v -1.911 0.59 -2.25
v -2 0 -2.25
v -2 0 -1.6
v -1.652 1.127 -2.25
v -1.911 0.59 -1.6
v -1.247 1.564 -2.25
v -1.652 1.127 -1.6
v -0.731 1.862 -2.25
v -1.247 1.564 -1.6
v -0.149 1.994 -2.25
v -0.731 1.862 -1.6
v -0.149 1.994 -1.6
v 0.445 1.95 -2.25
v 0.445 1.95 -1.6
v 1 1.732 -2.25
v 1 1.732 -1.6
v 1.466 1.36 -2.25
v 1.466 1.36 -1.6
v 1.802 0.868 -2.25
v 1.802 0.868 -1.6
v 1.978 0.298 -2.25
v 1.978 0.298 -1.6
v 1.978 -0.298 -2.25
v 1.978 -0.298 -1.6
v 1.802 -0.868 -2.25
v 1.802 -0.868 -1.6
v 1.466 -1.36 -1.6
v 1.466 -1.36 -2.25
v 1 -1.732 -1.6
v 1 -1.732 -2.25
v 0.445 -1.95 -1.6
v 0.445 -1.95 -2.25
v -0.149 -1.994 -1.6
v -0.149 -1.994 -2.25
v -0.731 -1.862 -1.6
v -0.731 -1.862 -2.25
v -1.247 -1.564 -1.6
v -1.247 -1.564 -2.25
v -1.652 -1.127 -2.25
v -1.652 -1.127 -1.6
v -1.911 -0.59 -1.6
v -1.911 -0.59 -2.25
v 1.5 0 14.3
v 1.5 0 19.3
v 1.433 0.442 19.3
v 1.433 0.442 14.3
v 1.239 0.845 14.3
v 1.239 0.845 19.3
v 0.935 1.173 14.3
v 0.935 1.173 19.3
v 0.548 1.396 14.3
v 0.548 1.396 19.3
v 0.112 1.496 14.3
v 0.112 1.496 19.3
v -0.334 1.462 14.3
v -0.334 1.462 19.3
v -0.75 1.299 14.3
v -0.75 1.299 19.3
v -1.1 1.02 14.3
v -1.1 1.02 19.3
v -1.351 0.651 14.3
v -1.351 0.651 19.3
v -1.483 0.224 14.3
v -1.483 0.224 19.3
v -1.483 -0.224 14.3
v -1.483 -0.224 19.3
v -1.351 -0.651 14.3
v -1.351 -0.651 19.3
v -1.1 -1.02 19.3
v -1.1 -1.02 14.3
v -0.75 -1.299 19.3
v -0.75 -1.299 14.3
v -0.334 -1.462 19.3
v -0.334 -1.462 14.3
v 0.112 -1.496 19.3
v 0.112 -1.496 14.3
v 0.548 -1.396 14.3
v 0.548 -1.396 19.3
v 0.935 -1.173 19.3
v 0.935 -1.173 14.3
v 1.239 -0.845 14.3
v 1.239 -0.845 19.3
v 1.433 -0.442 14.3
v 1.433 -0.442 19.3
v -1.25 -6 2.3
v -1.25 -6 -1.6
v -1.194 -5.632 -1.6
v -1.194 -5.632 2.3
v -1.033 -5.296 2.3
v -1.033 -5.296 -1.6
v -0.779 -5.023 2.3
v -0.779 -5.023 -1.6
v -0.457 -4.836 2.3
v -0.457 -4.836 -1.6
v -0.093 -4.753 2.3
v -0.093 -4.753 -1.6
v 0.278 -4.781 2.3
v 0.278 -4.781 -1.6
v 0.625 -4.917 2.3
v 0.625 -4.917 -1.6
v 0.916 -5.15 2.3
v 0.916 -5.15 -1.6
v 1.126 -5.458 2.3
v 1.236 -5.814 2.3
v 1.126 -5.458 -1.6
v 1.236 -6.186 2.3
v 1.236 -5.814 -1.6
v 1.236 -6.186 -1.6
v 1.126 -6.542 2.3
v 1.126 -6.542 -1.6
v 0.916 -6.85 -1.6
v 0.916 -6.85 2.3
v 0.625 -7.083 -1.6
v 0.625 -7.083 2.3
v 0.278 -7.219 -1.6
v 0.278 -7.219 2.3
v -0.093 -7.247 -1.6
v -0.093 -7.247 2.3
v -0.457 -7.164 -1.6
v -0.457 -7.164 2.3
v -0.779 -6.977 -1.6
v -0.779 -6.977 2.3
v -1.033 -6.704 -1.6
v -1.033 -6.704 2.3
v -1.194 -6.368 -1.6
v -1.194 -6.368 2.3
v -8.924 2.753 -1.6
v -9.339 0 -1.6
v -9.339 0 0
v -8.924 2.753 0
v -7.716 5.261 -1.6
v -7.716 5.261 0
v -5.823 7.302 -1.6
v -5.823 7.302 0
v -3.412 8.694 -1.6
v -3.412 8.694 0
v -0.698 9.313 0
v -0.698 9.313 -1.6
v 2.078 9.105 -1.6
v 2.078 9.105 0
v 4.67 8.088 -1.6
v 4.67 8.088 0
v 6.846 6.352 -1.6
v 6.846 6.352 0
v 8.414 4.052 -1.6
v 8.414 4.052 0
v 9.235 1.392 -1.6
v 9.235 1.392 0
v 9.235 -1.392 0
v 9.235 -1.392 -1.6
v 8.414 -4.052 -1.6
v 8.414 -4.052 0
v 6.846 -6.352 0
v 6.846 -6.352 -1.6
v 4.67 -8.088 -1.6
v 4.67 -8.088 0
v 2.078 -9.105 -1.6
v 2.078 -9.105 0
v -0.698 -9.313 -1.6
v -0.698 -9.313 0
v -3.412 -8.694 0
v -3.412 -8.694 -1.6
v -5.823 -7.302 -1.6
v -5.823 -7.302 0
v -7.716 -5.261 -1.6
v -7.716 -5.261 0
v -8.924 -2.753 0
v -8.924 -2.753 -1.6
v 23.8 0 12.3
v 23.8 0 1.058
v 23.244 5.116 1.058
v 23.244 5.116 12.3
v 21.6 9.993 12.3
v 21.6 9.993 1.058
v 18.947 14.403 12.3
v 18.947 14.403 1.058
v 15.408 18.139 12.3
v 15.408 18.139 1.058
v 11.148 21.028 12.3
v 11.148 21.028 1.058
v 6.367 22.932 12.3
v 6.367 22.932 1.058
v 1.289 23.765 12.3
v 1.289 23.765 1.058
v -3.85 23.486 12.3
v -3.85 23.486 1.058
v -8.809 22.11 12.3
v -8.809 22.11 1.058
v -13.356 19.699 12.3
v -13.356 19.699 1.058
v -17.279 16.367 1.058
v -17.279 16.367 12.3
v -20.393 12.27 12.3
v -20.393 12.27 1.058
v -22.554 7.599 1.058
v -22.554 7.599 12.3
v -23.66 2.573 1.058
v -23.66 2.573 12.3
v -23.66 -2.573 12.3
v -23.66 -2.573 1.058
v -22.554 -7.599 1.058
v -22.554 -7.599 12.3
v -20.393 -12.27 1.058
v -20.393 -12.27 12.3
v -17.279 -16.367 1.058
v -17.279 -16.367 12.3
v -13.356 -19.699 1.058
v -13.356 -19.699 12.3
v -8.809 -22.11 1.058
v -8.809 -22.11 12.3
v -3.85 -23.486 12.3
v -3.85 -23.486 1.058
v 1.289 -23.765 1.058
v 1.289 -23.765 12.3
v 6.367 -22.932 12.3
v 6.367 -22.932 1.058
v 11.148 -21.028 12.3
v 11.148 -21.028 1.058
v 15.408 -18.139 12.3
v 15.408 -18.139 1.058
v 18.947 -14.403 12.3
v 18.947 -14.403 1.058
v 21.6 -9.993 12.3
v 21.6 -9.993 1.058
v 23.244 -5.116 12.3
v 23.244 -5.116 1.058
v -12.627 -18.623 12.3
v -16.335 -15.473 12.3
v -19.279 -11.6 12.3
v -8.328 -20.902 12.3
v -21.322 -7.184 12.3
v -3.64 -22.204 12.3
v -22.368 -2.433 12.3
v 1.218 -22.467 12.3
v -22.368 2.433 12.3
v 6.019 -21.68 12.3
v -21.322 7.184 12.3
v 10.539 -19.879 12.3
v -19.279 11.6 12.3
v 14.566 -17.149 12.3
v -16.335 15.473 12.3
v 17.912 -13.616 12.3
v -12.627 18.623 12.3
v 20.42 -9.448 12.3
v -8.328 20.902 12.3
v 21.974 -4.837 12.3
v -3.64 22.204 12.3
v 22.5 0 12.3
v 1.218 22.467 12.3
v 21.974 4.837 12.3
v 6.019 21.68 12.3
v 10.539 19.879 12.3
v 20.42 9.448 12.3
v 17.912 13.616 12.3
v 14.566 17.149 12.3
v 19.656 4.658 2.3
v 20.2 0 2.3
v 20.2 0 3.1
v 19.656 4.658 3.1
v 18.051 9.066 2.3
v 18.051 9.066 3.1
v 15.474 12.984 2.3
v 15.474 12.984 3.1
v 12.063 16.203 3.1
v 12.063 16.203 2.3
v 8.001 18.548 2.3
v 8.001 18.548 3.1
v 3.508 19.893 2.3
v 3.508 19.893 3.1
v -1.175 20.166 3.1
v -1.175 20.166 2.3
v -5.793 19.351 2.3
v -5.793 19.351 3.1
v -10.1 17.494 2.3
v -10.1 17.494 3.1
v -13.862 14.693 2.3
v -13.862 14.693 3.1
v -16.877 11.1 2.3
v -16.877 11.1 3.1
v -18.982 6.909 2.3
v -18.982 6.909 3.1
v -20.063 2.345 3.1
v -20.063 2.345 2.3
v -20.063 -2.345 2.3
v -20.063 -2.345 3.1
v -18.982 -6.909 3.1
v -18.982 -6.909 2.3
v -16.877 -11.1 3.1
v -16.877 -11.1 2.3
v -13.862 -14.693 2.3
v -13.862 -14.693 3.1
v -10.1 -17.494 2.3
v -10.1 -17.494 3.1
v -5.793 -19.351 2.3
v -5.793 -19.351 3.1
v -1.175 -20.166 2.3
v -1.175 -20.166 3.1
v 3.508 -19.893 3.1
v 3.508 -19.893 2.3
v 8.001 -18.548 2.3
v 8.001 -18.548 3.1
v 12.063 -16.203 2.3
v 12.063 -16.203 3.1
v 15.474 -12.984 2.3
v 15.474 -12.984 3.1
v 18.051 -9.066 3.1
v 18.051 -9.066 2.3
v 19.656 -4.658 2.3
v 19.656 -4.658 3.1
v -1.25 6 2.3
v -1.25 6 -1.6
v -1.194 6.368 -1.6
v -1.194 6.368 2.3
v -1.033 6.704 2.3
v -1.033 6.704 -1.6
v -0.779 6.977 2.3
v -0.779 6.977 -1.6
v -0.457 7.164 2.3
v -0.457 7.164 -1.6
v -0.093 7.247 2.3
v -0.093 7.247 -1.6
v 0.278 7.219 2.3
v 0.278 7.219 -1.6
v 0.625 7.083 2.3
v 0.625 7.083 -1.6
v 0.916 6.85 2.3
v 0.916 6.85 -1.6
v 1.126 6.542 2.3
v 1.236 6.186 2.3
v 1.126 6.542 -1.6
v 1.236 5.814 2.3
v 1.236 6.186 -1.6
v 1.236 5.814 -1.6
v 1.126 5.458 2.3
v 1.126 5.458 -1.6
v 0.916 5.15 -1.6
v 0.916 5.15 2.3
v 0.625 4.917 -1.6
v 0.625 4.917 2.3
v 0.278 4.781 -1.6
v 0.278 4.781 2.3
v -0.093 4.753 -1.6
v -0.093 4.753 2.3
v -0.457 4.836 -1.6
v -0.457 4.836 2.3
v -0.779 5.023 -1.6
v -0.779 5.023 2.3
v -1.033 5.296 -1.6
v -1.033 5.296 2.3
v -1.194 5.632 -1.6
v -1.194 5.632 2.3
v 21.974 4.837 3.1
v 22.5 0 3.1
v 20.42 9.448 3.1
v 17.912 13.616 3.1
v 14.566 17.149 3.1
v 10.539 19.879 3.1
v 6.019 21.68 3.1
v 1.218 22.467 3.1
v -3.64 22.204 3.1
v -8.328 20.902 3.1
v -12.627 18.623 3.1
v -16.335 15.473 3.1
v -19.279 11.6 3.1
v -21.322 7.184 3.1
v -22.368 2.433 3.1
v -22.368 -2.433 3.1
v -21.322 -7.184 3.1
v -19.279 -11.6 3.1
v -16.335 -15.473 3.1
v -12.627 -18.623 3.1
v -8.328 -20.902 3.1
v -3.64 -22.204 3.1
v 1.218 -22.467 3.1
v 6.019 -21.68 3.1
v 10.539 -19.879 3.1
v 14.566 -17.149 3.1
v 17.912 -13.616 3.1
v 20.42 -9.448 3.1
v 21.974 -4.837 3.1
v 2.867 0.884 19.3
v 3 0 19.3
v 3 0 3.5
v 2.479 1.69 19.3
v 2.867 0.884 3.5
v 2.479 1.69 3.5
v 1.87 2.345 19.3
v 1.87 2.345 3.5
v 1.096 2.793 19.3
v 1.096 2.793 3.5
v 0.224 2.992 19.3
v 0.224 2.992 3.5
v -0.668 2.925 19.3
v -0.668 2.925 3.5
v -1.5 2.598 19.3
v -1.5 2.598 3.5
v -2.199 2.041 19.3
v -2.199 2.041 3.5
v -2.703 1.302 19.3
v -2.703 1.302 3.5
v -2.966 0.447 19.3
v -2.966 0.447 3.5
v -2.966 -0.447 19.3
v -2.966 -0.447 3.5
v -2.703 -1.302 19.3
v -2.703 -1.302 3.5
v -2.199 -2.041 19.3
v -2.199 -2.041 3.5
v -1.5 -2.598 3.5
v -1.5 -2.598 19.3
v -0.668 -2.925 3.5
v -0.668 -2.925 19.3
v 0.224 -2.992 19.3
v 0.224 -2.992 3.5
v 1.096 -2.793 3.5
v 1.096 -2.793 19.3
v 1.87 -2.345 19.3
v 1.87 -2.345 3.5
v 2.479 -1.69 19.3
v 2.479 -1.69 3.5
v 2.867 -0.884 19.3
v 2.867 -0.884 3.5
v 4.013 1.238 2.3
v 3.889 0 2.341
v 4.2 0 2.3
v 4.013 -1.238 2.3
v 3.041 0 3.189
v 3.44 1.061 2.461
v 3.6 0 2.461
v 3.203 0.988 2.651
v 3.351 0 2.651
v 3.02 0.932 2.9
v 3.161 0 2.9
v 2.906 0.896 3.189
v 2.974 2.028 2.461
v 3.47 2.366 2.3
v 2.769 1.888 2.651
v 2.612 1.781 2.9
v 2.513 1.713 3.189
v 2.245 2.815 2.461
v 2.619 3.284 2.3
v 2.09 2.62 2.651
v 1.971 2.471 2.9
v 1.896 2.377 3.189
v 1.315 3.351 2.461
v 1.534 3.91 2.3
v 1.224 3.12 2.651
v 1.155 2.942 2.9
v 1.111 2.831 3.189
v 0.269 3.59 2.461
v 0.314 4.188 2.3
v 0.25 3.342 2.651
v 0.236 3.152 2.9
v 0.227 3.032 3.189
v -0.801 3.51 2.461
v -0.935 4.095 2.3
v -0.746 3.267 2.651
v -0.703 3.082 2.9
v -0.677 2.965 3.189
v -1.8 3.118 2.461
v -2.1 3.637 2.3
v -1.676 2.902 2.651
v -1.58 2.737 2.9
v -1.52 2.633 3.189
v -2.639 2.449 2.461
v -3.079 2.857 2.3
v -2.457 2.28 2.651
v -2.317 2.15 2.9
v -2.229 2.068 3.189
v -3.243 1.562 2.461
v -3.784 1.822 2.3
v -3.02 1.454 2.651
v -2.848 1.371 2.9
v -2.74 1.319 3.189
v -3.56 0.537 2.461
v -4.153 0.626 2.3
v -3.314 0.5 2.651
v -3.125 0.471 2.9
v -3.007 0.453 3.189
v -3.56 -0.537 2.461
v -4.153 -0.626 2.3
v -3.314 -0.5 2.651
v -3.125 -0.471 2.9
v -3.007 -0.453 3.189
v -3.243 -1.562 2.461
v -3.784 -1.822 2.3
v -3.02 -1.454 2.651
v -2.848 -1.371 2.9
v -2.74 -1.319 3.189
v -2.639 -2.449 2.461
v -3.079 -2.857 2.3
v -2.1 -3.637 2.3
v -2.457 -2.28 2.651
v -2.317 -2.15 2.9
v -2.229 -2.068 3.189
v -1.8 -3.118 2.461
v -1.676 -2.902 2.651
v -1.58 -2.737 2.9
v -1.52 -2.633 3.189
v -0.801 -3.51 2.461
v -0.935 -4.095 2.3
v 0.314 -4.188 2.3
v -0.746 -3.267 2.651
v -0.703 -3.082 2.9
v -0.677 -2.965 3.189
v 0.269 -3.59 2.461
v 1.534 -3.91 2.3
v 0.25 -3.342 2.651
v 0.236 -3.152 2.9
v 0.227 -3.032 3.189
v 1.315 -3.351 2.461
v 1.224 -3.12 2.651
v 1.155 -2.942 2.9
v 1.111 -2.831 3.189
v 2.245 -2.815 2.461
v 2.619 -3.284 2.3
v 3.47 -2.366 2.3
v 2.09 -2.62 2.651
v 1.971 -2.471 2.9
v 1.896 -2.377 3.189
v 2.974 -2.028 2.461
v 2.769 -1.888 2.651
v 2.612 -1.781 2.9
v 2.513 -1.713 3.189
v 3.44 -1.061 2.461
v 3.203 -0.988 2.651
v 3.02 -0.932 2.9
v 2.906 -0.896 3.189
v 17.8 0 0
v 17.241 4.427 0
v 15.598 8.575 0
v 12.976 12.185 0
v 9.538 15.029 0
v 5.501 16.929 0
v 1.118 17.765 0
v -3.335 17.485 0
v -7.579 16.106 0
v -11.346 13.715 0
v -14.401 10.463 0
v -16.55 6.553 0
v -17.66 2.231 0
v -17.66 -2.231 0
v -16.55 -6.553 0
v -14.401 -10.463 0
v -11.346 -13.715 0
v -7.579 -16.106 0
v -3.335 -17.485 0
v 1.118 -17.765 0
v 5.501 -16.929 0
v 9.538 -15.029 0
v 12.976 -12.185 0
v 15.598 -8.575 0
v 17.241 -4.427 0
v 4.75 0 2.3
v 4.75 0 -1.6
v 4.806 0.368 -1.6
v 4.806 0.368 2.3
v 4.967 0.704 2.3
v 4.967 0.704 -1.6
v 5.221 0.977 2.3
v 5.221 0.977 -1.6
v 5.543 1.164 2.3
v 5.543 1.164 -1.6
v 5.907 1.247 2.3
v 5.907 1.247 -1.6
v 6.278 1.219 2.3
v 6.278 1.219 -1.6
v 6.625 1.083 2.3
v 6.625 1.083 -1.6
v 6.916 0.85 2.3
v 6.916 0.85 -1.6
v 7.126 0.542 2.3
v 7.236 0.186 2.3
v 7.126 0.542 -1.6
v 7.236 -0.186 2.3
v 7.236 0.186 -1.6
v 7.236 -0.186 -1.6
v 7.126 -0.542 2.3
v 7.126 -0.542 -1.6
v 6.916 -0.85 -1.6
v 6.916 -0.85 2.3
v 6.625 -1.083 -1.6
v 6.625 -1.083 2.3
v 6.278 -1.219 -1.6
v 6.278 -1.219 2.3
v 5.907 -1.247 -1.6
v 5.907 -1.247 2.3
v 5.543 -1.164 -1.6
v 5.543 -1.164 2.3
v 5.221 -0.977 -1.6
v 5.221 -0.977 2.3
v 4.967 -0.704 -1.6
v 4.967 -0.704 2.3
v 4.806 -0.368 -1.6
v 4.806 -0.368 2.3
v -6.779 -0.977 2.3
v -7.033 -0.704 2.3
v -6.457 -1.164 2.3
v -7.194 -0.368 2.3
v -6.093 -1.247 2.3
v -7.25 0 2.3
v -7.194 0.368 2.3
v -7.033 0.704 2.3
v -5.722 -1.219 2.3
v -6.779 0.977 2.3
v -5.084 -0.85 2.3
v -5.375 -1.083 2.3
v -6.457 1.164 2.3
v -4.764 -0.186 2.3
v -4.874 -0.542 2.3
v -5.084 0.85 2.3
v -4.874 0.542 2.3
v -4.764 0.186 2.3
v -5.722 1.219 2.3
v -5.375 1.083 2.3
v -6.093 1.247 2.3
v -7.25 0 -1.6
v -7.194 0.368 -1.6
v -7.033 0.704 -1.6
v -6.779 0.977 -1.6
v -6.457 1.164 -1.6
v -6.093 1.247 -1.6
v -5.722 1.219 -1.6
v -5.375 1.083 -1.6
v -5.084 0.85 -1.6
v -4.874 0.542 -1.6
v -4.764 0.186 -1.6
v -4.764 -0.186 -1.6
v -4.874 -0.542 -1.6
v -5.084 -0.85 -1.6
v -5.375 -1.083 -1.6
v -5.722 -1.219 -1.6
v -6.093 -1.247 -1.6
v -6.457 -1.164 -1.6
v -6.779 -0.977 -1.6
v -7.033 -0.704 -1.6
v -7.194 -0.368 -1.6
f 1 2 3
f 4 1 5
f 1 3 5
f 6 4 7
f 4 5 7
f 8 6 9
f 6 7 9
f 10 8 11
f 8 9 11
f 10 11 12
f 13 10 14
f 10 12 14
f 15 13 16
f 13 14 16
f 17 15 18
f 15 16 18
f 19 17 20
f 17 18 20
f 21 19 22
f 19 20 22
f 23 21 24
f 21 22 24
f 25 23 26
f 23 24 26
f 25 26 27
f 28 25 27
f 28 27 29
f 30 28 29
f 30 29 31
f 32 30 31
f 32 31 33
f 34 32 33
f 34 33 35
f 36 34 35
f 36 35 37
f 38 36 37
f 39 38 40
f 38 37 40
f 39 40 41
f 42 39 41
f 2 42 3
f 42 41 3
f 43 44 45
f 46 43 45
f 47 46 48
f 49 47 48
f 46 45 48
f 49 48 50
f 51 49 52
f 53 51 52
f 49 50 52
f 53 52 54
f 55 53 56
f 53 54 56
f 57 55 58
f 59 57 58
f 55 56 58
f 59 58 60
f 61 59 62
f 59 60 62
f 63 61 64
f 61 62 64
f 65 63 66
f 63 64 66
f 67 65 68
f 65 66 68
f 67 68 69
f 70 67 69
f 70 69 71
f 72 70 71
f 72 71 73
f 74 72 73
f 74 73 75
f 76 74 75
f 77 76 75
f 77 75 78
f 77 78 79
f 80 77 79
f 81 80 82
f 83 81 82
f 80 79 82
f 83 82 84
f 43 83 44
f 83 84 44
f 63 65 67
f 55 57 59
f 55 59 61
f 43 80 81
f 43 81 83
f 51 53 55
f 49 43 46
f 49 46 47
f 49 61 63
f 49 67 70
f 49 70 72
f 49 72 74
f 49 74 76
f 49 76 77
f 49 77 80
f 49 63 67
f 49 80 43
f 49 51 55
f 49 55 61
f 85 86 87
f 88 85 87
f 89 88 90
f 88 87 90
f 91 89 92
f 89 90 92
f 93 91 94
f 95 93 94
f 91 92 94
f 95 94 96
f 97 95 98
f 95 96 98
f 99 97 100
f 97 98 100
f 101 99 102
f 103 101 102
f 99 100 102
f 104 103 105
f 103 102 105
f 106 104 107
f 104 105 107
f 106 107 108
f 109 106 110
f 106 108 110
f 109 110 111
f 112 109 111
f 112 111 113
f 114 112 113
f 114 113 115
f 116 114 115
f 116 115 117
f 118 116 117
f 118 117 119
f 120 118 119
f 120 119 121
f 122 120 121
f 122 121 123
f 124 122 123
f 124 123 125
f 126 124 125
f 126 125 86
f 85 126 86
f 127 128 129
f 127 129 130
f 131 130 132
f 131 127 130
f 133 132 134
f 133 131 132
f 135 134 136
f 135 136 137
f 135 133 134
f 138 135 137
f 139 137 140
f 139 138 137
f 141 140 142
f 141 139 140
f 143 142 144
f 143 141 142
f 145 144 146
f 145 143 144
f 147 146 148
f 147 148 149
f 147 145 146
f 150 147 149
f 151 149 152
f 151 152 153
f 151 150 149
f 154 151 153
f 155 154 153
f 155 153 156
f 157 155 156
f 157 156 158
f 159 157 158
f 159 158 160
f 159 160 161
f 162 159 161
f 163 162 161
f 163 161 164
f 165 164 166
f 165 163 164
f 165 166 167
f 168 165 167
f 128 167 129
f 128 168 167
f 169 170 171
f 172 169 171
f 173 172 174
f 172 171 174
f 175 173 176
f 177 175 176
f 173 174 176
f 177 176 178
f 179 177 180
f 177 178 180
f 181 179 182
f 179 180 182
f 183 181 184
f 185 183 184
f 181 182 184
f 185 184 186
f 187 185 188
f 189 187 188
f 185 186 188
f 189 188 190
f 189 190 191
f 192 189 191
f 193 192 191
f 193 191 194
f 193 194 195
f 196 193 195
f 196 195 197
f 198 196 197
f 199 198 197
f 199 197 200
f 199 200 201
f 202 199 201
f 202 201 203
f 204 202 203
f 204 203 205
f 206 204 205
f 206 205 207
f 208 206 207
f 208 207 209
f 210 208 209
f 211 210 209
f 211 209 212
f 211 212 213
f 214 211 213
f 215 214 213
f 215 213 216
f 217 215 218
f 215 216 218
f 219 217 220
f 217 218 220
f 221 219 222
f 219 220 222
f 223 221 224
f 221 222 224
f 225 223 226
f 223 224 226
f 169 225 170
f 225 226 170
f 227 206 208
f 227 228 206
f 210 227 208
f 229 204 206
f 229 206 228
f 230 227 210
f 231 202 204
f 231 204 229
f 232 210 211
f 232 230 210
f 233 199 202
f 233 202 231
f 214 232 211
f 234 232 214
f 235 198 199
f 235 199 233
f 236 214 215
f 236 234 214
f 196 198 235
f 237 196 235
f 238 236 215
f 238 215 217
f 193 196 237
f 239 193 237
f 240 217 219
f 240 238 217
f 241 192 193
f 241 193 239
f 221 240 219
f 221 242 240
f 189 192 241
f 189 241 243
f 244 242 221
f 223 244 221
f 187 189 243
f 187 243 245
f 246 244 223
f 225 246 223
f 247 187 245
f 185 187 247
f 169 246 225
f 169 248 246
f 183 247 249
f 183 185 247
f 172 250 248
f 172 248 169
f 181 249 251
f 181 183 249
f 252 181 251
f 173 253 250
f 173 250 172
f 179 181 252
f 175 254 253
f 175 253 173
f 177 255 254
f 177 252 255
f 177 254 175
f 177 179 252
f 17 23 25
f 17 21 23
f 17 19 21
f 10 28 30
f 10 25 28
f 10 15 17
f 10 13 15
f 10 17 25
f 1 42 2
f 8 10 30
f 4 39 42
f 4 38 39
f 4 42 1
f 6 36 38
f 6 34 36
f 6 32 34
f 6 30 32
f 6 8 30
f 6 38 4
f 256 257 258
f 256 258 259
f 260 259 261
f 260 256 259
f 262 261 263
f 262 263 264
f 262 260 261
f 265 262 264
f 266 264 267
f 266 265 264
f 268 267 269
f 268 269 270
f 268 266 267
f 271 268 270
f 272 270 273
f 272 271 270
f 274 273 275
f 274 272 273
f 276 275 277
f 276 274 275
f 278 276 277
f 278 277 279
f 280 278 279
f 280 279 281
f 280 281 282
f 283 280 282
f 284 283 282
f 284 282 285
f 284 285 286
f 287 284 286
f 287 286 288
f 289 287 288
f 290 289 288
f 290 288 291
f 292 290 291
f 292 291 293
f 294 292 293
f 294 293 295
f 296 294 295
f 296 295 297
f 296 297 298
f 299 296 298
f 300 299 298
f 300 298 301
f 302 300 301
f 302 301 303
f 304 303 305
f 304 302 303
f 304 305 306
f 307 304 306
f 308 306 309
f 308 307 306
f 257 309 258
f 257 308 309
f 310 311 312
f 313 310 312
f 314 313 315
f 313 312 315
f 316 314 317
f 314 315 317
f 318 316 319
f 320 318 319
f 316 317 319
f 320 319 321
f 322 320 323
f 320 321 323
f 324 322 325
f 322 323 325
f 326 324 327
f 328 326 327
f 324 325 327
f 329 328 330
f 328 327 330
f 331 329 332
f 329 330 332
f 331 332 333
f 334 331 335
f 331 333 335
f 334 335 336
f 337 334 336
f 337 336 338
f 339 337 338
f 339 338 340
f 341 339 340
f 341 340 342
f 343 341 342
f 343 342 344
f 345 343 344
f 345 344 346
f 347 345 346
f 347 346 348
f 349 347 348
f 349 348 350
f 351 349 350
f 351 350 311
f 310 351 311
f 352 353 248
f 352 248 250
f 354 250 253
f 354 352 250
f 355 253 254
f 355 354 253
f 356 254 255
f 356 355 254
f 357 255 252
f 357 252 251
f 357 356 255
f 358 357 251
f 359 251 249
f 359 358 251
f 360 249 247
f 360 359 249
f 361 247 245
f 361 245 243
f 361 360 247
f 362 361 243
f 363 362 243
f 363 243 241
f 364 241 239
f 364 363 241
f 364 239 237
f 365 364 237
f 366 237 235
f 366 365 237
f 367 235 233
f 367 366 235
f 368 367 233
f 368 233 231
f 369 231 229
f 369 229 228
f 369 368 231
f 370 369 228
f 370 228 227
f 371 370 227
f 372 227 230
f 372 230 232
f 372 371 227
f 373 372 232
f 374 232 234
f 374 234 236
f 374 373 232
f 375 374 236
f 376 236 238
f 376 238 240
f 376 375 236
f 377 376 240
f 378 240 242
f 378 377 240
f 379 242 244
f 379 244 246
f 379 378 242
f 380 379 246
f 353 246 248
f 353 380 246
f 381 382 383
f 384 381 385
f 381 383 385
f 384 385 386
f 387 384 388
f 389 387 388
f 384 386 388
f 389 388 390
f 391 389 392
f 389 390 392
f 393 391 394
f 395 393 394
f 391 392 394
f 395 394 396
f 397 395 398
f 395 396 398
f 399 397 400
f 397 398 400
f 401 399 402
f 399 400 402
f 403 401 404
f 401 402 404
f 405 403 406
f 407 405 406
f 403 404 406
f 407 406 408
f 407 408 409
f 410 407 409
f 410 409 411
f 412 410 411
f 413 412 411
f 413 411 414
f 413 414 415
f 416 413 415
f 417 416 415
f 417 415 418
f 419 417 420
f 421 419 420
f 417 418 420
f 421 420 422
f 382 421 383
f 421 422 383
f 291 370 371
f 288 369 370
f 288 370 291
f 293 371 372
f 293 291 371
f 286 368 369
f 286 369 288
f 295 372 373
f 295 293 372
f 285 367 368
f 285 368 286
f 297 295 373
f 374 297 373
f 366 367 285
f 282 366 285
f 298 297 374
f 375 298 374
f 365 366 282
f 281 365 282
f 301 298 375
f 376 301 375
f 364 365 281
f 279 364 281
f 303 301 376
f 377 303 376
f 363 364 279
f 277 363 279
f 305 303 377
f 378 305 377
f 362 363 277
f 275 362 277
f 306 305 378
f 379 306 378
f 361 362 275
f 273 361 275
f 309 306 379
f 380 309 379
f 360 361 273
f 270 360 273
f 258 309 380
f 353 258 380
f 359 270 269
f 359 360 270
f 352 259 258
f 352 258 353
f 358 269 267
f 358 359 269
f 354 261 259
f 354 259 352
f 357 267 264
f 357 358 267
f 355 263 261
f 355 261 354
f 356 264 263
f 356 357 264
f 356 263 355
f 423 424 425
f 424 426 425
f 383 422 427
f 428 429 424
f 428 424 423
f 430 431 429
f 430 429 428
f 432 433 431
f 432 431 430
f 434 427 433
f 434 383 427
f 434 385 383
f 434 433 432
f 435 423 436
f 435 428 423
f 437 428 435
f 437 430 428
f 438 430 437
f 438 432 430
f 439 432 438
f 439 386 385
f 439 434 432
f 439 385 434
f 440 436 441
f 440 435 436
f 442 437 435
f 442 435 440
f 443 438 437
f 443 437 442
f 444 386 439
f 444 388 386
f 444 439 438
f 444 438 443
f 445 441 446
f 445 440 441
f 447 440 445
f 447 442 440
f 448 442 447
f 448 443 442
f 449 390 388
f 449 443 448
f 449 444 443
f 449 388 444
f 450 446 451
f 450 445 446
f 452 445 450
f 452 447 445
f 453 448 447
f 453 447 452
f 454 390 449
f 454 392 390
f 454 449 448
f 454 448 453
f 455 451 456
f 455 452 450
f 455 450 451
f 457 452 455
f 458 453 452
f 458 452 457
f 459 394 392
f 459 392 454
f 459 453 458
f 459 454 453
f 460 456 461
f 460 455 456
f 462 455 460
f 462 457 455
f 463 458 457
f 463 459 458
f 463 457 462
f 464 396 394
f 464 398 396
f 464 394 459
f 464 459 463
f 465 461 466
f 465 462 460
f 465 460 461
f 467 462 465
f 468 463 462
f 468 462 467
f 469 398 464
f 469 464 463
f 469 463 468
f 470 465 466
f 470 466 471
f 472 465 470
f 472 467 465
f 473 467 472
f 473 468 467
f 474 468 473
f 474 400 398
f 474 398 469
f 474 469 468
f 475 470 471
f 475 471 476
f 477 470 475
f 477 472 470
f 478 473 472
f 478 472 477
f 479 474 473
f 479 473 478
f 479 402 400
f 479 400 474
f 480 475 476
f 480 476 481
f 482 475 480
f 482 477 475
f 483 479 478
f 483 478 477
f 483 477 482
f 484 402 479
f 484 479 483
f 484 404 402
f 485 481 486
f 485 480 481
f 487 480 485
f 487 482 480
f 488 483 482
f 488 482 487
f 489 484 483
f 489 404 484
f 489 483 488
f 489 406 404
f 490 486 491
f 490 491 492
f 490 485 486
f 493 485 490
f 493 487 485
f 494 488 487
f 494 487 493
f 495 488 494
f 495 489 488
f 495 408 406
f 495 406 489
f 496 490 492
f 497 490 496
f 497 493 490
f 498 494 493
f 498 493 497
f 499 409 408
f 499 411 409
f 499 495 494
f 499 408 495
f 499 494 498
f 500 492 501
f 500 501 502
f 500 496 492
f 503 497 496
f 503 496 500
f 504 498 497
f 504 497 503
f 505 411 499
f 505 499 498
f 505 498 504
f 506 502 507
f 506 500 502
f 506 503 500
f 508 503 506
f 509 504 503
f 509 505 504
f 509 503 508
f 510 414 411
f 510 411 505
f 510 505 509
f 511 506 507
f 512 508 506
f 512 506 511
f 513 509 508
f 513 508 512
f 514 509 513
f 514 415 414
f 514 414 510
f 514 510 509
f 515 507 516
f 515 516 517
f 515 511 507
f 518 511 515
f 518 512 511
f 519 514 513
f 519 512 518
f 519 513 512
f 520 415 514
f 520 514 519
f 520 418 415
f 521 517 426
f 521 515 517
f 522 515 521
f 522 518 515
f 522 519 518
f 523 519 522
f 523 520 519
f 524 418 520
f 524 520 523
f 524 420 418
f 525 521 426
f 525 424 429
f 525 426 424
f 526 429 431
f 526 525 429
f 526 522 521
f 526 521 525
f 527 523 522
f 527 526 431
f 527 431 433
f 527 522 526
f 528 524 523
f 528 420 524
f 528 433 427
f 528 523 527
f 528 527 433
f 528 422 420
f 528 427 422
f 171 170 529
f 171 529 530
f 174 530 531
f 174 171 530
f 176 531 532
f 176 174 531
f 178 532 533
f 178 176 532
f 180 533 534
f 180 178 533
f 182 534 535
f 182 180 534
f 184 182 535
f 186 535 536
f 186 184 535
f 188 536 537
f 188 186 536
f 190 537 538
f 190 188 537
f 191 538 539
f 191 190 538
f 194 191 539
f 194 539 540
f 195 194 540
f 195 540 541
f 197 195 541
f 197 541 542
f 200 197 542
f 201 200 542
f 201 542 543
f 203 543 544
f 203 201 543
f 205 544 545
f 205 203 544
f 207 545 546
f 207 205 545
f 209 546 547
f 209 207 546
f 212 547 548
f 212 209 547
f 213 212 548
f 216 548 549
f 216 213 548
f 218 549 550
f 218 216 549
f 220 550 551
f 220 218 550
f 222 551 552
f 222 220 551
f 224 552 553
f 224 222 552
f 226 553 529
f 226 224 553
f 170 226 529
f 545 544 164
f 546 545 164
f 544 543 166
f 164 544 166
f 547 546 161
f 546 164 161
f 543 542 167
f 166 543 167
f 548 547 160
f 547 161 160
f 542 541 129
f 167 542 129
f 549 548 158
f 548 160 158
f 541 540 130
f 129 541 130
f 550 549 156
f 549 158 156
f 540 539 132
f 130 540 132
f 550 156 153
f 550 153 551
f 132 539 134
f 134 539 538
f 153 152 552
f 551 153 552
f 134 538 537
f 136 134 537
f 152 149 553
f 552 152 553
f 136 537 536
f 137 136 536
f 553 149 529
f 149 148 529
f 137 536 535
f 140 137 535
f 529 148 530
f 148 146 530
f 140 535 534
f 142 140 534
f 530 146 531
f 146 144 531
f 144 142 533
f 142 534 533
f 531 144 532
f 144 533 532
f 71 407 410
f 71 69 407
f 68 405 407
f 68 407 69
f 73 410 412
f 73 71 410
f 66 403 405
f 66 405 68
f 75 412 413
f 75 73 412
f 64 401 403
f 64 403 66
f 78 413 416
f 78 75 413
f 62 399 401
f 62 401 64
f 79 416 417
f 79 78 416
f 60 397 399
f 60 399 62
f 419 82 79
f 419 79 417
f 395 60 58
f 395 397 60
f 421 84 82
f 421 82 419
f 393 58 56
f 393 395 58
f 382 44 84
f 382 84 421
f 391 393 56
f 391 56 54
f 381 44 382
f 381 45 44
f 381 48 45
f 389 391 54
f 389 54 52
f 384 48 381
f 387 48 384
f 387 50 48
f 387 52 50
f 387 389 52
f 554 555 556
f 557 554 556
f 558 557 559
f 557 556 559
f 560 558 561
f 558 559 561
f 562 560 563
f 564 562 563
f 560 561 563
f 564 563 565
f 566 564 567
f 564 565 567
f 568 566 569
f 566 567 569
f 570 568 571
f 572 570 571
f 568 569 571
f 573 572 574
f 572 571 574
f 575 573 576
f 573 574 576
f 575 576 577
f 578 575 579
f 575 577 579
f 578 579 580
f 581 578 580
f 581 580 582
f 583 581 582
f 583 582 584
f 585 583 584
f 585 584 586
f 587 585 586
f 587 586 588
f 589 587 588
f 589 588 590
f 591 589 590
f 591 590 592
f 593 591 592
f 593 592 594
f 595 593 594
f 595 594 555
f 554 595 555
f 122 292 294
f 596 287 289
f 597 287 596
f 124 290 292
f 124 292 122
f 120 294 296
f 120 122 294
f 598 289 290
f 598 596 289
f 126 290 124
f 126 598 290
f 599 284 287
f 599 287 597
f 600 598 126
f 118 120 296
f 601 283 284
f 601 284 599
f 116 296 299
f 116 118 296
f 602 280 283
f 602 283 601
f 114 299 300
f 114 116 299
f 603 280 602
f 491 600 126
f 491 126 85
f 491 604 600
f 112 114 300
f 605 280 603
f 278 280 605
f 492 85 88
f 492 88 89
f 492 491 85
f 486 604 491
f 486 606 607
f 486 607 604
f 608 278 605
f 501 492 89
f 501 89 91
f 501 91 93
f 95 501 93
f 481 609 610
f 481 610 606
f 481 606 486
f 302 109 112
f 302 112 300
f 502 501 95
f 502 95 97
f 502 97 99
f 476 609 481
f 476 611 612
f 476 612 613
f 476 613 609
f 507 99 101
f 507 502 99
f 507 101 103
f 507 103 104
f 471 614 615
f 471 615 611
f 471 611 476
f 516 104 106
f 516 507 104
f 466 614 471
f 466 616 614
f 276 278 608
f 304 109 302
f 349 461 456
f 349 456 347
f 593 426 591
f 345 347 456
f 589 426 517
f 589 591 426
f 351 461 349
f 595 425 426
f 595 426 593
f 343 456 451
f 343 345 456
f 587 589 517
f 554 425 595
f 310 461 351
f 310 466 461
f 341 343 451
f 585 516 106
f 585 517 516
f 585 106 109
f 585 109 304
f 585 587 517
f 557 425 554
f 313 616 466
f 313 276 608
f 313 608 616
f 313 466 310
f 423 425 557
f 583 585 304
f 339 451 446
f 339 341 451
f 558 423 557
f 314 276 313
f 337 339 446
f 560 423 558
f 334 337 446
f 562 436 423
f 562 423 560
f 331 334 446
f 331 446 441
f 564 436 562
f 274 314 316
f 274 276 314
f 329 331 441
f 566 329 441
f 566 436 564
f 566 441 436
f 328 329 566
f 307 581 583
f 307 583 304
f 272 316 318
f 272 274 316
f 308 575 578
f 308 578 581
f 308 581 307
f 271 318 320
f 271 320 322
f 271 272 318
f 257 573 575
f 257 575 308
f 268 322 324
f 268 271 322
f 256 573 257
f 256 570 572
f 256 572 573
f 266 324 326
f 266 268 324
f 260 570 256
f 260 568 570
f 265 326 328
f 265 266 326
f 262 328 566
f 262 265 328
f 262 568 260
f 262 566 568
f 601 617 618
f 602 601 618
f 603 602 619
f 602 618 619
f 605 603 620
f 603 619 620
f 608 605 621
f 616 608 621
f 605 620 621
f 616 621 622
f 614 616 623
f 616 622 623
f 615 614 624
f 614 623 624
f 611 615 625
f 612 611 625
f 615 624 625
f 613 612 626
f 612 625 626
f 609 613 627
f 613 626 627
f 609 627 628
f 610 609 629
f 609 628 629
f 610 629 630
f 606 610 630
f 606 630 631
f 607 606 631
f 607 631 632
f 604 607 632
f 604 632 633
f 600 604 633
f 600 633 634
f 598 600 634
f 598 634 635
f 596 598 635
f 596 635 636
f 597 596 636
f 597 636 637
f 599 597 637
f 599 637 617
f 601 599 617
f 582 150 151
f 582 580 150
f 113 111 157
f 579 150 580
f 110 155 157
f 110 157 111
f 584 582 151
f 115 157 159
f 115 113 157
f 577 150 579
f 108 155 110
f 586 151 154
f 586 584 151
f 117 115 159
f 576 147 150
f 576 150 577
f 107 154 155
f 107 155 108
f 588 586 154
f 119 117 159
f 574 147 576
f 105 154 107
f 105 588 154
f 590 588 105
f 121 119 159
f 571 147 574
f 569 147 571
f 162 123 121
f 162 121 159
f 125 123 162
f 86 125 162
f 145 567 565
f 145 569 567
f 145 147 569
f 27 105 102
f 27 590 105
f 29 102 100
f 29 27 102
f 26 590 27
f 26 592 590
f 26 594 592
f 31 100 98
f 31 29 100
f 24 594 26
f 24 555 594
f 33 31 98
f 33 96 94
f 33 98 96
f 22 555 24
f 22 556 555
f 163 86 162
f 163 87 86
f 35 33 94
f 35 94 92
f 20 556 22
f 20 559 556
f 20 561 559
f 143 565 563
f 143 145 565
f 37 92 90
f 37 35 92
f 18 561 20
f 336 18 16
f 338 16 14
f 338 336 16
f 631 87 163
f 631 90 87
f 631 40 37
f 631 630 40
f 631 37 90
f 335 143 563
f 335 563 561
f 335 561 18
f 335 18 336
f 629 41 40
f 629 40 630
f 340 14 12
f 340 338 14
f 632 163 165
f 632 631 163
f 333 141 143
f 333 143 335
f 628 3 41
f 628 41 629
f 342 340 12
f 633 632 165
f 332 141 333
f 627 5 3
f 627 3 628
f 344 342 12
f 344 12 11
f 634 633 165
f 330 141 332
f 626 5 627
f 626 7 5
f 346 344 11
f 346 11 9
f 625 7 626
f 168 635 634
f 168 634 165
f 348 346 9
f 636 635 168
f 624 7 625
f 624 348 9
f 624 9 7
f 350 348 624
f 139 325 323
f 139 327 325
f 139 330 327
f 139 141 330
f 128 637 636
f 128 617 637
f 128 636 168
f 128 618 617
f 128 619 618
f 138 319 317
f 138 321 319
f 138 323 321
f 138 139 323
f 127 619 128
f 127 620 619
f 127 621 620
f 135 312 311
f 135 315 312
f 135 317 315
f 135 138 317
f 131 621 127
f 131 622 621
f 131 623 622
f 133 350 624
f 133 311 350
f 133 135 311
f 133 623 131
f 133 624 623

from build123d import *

# Parameters (mm, degrees)
SKETCH1_R               = 23.8
BOSS_EXTRUDE1_DEPTH     = 2.3
SKETCH2_R               = 23.8
SKETCH2_R_2             = 20.2
BOSS_EXTRUDE2_DEPTH     = 10
SKETCH3_R               = 3
BOSS_EXTRUDE3_DEPTH     = 17
CHAMFER1_SIZE           = 6
CHAMFER1_SIZE2          = 1.057961884
SKETCH4_R               = 1.25
CUT_EXTRUDE1_DEPTH      = 15
CUT_EXTRUDE3_START      = -9.2
SKETCH6_R               = 22.5
SKETCH6_R_2             = 20.2
CUT_EXTRUDE3_DEPTH      = 9.2
SKETCH7_R               = 1.5
CUT_EXTRUDE4_DEPTH      = 5
REDONDEO1_R             = 1.2
SALIENTE_EXTRUIR1_START = 1.6
CROQUIS1_R              = 9.339254136
CROQUIS1_R_2            = 1.25
SALIENTE_EXTRUIR1_DEPTH = 1.6
CROQUIS2_R              = 2
SALIENTE_EXTRUIR2_DEPTH = 3
CROQUIS4_R              = 4.654338303
CORTAR_EXTRUIR1_DEPTH   = 2.35


with BuildPart() as part:
    # Sketch1 → Boss-Extrude1 (new body)
    with BuildSketch(Plane.XY):
        Circle(SKETCH1_R)
    extrude(amount=BOSS_EXTRUDE1_DEPTH)

    # Sketch2 → Boss-Extrude2 (add)
    with BuildSketch(Plane.XY.offset(2.3)):
        Circle(SKETCH2_R)
        Circle(SKETCH2_R_2, mode=Mode.SUBTRACT)
    extrude(amount=BOSS_EXTRUDE2_DEPTH)

    # Sketch3 → Boss-Extrude3 (add)
    with BuildSketch(Plane.XY.offset(2.3)):
        Circle(SKETCH3_R)
    extrude(amount=BOSS_EXTRUDE3_DEPTH)

    # Chamfer1
    chamfer1_edges = [part.edges().sort_by_distance(p)[0] for p in [
        (-23.8, 0, 0),
    ]]
    chamfer1_side = [part.faces().sort_by_distance(p)[0] for p in [
        (0, 0, 0),
    ]]
    chamfer(chamfer1_edges, length=CHAMFER1_SIZE, length2=CHAMFER1_SIZE2, reference=chamfer1_side[0])

    # Sketch4 → Cut-Extrude1 (cut)
    with BuildSketch(Plane(origin=(0, 0, 0), x_dir=(-1, 0, 0), z_dir=(0, 0, -1))):
        with Locations((6, 0)):
            Circle(SKETCH4_R)
        with Locations((0, -6)):
            Circle(SKETCH4_R)
        with Locations((-6, 0)):
            Circle(SKETCH4_R)
        with Locations((0, 6)):
            Circle(SKETCH4_R)
    extrude(amount=-CUT_EXTRUDE1_DEPTH, mode=Mode.SUBTRACT)

    # Sketch6 → Cut-Extrude3 (cut)
    with BuildSketch(Plane.XY.offset(12.3).offset(CUT_EXTRUDE3_START)):
        Circle(SKETCH6_R)
        Circle(SKETCH6_R_2, mode=Mode.SUBTRACT)
    extrude(amount=CUT_EXTRUDE3_DEPTH, mode=Mode.SUBTRACT)

    # Sketch7 → Cut-Extrude4 (cut)
    with BuildSketch(Plane.XY.offset(19.3)):
        Circle(SKETCH7_R)
    extrude(amount=-CUT_EXTRUDE4_DEPTH, mode=Mode.SUBTRACT)

    # Redondeo1
    redondeo1_edges = [part.edges().sort_by_distance(p)[0] for p in [
        (-3, 0, 2.3),
    ]]
    fillet(redondeo1_edges, radius=REDONDEO1_R)

    # Croquis1 → Saliente-Extruir1 (add)
    with BuildSketch(Plane(origin=(0, 0, 0), x_dir=(-1, 0, 0), z_dir=(0, 0, -1)).offset(SALIENTE_EXTRUIR1_START)):
        Circle(CROQUIS1_R)
        with Locations((0, 6)):
            Circle(CROQUIS1_R_2, mode=Mode.SUBTRACT)
        with Locations((6, 0)):
            Circle(CROQUIS1_R_2, mode=Mode.SUBTRACT)
        with Locations((0, -6)):
            Circle(CROQUIS1_R_2, mode=Mode.SUBTRACT)
        with Locations((-6, 0)):
            Circle(CROQUIS1_R_2, mode=Mode.SUBTRACT)
    extrude(amount=-SALIENTE_EXTRUIR1_DEPTH)

    # Croquis2 → Saliente-Extruir2 (add)
    with BuildSketch(Plane(origin=(0, 0, -1.6), x_dir=(-1, 0, 0), z_dir=(0, 0, -1))):
        Circle(CROQUIS2_R)
    extrude(amount=SALIENTE_EXTRUIR2_DEPTH)

    # Croquis4 → Cortar-Extruir1 (cut)
    with BuildSketch(Plane(origin=(0, 0, -4.6), x_dir=(-1, 0, 0), z_dir=(0, 0, -1))):
        Circle(CROQUIS4_R)
    extrude(amount=-CORTAR_EXTRUIR1_DEPTH, mode=Mode.SUBTRACT)


solid = part.part
